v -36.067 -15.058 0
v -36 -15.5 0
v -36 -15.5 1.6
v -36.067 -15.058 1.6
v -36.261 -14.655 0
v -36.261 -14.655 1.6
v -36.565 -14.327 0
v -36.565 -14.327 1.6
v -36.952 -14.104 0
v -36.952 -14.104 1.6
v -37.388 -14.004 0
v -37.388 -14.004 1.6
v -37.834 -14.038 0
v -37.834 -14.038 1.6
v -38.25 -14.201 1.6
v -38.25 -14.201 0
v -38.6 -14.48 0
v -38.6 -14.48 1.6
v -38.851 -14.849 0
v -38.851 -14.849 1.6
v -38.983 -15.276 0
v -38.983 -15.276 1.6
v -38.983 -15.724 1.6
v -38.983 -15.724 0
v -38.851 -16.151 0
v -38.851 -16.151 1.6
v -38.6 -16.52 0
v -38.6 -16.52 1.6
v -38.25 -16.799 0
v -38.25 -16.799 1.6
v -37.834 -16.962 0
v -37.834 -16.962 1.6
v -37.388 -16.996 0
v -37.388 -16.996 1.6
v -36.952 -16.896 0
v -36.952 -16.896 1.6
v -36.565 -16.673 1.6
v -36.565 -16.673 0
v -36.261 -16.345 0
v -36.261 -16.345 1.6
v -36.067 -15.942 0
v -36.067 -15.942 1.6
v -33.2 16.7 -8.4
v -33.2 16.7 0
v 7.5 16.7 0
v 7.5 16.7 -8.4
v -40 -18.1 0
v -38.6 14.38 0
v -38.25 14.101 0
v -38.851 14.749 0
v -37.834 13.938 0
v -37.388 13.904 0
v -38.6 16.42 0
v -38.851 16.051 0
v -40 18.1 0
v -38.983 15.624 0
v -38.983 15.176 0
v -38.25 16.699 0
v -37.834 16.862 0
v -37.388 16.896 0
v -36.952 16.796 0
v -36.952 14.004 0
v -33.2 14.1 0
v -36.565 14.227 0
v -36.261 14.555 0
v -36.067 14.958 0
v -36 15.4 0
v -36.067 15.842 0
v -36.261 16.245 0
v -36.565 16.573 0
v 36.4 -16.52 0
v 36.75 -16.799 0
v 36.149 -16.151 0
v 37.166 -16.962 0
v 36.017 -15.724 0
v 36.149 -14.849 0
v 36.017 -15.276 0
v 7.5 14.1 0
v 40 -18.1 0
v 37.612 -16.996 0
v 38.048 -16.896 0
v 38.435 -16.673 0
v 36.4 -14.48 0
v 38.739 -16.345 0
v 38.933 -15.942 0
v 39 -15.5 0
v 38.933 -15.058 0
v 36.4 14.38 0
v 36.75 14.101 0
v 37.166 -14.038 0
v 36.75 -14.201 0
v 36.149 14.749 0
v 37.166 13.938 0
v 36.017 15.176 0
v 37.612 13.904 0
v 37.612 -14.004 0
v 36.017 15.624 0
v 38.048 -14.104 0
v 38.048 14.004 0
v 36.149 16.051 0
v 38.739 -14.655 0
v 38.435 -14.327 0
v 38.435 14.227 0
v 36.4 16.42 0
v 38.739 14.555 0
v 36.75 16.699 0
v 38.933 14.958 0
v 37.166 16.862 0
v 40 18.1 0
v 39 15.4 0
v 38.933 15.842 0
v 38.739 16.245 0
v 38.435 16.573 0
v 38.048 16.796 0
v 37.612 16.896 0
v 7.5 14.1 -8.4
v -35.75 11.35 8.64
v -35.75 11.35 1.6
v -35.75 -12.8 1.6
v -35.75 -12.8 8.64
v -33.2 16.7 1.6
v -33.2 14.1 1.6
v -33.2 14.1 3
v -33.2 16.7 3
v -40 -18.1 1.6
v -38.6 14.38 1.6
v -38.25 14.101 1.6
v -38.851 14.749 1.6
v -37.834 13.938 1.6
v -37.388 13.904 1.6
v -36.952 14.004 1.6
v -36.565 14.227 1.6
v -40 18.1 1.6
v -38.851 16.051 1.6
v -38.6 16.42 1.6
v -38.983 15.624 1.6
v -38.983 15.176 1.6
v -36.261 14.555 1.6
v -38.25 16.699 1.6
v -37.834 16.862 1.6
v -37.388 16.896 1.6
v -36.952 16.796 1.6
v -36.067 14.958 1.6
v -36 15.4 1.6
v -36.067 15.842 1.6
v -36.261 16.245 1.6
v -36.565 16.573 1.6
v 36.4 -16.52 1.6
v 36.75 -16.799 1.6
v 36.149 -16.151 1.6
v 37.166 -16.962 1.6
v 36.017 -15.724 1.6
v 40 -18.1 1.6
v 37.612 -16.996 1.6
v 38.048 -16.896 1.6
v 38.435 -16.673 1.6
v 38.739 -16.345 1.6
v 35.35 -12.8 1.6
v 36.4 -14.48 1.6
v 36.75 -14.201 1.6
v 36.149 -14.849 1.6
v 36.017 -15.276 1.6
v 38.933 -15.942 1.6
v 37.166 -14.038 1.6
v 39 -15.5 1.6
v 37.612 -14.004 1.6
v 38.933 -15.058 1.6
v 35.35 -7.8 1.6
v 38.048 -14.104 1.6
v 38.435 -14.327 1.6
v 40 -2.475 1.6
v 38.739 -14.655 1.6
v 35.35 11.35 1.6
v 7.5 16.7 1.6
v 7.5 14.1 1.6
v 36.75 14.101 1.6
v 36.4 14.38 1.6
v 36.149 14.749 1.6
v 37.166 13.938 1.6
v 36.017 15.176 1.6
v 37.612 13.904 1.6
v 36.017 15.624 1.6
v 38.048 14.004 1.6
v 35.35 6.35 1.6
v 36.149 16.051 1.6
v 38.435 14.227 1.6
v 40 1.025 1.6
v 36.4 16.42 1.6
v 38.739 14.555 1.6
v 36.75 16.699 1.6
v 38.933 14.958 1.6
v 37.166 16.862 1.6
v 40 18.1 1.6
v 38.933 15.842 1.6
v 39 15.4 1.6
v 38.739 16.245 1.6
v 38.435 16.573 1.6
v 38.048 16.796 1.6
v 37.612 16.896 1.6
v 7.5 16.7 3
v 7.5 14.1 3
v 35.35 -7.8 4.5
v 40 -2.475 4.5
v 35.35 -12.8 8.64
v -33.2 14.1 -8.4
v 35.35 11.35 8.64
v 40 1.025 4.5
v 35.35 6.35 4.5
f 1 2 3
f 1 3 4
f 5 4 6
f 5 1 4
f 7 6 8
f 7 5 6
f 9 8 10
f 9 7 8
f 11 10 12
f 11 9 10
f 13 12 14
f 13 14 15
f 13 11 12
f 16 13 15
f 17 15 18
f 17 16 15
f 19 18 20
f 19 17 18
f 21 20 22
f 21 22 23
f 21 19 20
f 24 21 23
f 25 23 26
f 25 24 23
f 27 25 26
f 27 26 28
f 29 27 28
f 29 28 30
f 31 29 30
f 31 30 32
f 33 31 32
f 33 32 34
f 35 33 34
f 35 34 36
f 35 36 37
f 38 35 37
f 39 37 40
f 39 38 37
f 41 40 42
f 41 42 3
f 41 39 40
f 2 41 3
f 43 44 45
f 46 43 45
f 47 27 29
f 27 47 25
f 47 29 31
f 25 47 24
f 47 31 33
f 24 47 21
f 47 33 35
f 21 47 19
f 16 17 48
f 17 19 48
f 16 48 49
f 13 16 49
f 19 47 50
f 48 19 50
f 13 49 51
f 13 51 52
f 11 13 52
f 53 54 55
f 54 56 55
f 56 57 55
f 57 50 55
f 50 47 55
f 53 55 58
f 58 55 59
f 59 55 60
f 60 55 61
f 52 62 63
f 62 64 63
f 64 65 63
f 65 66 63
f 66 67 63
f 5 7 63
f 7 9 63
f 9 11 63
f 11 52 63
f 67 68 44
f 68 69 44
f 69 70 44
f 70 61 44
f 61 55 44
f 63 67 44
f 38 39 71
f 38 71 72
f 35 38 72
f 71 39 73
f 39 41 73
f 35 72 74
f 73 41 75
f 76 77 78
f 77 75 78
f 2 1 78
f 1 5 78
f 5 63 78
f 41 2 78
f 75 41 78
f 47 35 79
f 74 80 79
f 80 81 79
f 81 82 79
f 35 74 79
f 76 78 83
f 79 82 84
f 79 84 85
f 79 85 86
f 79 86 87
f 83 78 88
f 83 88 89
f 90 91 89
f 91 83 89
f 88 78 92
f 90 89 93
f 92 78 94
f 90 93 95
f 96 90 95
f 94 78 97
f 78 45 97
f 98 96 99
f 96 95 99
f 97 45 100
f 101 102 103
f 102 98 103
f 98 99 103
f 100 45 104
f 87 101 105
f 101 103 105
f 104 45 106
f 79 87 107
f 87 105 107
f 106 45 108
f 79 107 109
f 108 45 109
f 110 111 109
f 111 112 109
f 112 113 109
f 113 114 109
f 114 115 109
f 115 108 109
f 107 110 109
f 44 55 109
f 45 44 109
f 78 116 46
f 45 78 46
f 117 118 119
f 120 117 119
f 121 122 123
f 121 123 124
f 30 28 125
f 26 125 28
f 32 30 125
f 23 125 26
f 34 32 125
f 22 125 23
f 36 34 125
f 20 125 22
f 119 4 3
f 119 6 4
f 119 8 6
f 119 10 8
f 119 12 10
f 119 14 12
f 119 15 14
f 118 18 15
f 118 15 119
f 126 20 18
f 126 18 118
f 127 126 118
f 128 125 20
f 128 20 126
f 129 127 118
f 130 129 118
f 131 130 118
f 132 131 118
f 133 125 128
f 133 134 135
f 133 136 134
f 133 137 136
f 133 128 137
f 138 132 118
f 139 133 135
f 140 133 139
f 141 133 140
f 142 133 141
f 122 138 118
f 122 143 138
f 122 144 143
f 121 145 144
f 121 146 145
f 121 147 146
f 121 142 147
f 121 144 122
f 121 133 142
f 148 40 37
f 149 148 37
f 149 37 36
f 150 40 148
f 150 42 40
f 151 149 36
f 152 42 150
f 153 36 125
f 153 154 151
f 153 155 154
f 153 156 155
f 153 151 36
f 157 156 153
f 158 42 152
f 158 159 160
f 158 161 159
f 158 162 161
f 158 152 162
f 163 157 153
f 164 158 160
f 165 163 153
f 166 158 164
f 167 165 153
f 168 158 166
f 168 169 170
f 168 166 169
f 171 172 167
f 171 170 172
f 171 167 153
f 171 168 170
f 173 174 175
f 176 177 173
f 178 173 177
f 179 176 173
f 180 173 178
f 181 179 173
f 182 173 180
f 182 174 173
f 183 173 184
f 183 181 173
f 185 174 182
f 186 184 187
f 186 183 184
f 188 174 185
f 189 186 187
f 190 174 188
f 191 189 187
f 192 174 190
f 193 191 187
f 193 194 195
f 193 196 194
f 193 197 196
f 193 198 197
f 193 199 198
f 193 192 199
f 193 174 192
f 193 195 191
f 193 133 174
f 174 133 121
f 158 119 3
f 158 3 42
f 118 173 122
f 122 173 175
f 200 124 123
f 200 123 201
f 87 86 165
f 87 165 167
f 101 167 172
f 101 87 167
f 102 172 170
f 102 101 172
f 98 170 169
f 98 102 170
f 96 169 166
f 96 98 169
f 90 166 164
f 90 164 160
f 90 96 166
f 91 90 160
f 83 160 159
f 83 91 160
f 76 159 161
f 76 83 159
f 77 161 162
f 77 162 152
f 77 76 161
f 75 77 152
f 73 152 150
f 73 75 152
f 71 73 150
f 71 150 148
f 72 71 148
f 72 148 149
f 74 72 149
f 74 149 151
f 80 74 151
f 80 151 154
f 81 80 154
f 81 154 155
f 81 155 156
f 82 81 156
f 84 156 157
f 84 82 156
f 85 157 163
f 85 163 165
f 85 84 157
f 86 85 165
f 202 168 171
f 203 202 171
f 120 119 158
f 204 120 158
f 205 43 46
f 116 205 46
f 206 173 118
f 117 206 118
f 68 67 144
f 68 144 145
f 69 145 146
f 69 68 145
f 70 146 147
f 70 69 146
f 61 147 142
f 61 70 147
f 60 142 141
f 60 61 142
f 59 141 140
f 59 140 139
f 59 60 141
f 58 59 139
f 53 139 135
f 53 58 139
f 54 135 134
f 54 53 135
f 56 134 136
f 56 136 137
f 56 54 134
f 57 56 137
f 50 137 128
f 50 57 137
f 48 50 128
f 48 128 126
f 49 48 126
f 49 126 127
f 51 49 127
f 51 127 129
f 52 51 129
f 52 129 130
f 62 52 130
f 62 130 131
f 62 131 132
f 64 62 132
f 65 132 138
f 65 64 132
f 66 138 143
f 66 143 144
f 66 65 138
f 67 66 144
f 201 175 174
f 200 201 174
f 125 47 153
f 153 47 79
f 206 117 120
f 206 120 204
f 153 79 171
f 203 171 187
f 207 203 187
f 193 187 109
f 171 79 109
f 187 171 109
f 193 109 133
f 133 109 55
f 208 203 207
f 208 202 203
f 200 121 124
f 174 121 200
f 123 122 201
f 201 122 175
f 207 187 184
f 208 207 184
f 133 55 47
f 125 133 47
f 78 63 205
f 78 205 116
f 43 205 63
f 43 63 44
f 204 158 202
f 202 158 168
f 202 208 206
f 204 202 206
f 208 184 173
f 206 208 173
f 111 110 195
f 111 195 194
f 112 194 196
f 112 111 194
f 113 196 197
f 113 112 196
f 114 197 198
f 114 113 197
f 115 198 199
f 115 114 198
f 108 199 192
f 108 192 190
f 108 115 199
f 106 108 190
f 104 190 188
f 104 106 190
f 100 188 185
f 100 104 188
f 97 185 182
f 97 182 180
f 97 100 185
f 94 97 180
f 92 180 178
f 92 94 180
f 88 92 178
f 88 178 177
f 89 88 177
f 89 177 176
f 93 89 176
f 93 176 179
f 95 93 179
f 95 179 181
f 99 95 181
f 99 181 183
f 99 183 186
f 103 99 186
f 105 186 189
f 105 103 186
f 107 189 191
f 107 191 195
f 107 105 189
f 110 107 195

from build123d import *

# Parameters (mm, degrees)
F0_R          = 1.5
F0_W          = 40.7
F0_H          = 2.6
F1_DEPTH      = 1.6
F2_DEPTH      = 8.64
F3_DEPTH      = 8.4
F3_DEPTH_BACK = 3
F4_DEPTH      = 4.5


with BuildPart() as f1:
    # F0 (on Top) → F1 (new body)
    with BuildSketch(Plane.XY):
        Polygon((40, 18.1), (-40, 18.1), (-40, -18.1), (40, -18.1), (40, -2.475), (35.35, -7.8), (35.35, -12.8), (-35.75, -12.8), (-35.75, 11.35), (35.35, 11.35), (35.35, 6.35), (40, 1.025), align=None)
        with Locations((-37.5, -15.5)):
            Circle(F0_R, mode=Mode.SUBTRACT)
        with Locations((37.5, -15.5)):
            Circle(F0_R, mode=Mode.SUBTRACT)
        with Locations((-37.5, 15.4)):
            Circle(F0_R, mode=Mode.SUBTRACT)
        with Locations((-12.85, 15.4)):
            Rectangle(F0_W, F0_H, mode=Mode.SUBTRACT)
        with Locations((37.5, 15.4)):
            Circle(F0_R, mode=Mode.SUBTRACT)
        Polygon((35.35, -7.8), (35.35, 6.35), (35.35, 11.35), (-35.75, 11.35), (-35.75, -12.8), (35.35, -12.8), align=None)
    extrude(amount=F1_DEPTH)

    # F0 (on Top) → F2 (join)
    with BuildSketch(Plane.XY):
        Polygon((35.35, -7.8), (35.35, 6.35), (35.35, 11.35), (-35.75, 11.35), (-35.75, -12.8), (35.35, -12.8), align=None)
    extrude(amount=F2_DEPTH)

    # F0 (on Top) → F3 (join, two sides)
    with BuildSketch(Plane.XY) as f3_sk:
        with Locations((-12.85, 15.4)):
            Rectangle(F0_W, F0_H)
    extrude(amount=-F3_DEPTH)
    extrude(f3_sk.sketch, amount=F3_DEPTH_BACK)

    # F0 (on Top) → F4 (join)
    with BuildSketch(Plane.XY):
        Polygon((40, -2.475), (40, 1.025), (35.35, 6.35), (35.35, -7.8), align=None)
    extrude(amount=F4_DEPTH)


solid = f1.part
